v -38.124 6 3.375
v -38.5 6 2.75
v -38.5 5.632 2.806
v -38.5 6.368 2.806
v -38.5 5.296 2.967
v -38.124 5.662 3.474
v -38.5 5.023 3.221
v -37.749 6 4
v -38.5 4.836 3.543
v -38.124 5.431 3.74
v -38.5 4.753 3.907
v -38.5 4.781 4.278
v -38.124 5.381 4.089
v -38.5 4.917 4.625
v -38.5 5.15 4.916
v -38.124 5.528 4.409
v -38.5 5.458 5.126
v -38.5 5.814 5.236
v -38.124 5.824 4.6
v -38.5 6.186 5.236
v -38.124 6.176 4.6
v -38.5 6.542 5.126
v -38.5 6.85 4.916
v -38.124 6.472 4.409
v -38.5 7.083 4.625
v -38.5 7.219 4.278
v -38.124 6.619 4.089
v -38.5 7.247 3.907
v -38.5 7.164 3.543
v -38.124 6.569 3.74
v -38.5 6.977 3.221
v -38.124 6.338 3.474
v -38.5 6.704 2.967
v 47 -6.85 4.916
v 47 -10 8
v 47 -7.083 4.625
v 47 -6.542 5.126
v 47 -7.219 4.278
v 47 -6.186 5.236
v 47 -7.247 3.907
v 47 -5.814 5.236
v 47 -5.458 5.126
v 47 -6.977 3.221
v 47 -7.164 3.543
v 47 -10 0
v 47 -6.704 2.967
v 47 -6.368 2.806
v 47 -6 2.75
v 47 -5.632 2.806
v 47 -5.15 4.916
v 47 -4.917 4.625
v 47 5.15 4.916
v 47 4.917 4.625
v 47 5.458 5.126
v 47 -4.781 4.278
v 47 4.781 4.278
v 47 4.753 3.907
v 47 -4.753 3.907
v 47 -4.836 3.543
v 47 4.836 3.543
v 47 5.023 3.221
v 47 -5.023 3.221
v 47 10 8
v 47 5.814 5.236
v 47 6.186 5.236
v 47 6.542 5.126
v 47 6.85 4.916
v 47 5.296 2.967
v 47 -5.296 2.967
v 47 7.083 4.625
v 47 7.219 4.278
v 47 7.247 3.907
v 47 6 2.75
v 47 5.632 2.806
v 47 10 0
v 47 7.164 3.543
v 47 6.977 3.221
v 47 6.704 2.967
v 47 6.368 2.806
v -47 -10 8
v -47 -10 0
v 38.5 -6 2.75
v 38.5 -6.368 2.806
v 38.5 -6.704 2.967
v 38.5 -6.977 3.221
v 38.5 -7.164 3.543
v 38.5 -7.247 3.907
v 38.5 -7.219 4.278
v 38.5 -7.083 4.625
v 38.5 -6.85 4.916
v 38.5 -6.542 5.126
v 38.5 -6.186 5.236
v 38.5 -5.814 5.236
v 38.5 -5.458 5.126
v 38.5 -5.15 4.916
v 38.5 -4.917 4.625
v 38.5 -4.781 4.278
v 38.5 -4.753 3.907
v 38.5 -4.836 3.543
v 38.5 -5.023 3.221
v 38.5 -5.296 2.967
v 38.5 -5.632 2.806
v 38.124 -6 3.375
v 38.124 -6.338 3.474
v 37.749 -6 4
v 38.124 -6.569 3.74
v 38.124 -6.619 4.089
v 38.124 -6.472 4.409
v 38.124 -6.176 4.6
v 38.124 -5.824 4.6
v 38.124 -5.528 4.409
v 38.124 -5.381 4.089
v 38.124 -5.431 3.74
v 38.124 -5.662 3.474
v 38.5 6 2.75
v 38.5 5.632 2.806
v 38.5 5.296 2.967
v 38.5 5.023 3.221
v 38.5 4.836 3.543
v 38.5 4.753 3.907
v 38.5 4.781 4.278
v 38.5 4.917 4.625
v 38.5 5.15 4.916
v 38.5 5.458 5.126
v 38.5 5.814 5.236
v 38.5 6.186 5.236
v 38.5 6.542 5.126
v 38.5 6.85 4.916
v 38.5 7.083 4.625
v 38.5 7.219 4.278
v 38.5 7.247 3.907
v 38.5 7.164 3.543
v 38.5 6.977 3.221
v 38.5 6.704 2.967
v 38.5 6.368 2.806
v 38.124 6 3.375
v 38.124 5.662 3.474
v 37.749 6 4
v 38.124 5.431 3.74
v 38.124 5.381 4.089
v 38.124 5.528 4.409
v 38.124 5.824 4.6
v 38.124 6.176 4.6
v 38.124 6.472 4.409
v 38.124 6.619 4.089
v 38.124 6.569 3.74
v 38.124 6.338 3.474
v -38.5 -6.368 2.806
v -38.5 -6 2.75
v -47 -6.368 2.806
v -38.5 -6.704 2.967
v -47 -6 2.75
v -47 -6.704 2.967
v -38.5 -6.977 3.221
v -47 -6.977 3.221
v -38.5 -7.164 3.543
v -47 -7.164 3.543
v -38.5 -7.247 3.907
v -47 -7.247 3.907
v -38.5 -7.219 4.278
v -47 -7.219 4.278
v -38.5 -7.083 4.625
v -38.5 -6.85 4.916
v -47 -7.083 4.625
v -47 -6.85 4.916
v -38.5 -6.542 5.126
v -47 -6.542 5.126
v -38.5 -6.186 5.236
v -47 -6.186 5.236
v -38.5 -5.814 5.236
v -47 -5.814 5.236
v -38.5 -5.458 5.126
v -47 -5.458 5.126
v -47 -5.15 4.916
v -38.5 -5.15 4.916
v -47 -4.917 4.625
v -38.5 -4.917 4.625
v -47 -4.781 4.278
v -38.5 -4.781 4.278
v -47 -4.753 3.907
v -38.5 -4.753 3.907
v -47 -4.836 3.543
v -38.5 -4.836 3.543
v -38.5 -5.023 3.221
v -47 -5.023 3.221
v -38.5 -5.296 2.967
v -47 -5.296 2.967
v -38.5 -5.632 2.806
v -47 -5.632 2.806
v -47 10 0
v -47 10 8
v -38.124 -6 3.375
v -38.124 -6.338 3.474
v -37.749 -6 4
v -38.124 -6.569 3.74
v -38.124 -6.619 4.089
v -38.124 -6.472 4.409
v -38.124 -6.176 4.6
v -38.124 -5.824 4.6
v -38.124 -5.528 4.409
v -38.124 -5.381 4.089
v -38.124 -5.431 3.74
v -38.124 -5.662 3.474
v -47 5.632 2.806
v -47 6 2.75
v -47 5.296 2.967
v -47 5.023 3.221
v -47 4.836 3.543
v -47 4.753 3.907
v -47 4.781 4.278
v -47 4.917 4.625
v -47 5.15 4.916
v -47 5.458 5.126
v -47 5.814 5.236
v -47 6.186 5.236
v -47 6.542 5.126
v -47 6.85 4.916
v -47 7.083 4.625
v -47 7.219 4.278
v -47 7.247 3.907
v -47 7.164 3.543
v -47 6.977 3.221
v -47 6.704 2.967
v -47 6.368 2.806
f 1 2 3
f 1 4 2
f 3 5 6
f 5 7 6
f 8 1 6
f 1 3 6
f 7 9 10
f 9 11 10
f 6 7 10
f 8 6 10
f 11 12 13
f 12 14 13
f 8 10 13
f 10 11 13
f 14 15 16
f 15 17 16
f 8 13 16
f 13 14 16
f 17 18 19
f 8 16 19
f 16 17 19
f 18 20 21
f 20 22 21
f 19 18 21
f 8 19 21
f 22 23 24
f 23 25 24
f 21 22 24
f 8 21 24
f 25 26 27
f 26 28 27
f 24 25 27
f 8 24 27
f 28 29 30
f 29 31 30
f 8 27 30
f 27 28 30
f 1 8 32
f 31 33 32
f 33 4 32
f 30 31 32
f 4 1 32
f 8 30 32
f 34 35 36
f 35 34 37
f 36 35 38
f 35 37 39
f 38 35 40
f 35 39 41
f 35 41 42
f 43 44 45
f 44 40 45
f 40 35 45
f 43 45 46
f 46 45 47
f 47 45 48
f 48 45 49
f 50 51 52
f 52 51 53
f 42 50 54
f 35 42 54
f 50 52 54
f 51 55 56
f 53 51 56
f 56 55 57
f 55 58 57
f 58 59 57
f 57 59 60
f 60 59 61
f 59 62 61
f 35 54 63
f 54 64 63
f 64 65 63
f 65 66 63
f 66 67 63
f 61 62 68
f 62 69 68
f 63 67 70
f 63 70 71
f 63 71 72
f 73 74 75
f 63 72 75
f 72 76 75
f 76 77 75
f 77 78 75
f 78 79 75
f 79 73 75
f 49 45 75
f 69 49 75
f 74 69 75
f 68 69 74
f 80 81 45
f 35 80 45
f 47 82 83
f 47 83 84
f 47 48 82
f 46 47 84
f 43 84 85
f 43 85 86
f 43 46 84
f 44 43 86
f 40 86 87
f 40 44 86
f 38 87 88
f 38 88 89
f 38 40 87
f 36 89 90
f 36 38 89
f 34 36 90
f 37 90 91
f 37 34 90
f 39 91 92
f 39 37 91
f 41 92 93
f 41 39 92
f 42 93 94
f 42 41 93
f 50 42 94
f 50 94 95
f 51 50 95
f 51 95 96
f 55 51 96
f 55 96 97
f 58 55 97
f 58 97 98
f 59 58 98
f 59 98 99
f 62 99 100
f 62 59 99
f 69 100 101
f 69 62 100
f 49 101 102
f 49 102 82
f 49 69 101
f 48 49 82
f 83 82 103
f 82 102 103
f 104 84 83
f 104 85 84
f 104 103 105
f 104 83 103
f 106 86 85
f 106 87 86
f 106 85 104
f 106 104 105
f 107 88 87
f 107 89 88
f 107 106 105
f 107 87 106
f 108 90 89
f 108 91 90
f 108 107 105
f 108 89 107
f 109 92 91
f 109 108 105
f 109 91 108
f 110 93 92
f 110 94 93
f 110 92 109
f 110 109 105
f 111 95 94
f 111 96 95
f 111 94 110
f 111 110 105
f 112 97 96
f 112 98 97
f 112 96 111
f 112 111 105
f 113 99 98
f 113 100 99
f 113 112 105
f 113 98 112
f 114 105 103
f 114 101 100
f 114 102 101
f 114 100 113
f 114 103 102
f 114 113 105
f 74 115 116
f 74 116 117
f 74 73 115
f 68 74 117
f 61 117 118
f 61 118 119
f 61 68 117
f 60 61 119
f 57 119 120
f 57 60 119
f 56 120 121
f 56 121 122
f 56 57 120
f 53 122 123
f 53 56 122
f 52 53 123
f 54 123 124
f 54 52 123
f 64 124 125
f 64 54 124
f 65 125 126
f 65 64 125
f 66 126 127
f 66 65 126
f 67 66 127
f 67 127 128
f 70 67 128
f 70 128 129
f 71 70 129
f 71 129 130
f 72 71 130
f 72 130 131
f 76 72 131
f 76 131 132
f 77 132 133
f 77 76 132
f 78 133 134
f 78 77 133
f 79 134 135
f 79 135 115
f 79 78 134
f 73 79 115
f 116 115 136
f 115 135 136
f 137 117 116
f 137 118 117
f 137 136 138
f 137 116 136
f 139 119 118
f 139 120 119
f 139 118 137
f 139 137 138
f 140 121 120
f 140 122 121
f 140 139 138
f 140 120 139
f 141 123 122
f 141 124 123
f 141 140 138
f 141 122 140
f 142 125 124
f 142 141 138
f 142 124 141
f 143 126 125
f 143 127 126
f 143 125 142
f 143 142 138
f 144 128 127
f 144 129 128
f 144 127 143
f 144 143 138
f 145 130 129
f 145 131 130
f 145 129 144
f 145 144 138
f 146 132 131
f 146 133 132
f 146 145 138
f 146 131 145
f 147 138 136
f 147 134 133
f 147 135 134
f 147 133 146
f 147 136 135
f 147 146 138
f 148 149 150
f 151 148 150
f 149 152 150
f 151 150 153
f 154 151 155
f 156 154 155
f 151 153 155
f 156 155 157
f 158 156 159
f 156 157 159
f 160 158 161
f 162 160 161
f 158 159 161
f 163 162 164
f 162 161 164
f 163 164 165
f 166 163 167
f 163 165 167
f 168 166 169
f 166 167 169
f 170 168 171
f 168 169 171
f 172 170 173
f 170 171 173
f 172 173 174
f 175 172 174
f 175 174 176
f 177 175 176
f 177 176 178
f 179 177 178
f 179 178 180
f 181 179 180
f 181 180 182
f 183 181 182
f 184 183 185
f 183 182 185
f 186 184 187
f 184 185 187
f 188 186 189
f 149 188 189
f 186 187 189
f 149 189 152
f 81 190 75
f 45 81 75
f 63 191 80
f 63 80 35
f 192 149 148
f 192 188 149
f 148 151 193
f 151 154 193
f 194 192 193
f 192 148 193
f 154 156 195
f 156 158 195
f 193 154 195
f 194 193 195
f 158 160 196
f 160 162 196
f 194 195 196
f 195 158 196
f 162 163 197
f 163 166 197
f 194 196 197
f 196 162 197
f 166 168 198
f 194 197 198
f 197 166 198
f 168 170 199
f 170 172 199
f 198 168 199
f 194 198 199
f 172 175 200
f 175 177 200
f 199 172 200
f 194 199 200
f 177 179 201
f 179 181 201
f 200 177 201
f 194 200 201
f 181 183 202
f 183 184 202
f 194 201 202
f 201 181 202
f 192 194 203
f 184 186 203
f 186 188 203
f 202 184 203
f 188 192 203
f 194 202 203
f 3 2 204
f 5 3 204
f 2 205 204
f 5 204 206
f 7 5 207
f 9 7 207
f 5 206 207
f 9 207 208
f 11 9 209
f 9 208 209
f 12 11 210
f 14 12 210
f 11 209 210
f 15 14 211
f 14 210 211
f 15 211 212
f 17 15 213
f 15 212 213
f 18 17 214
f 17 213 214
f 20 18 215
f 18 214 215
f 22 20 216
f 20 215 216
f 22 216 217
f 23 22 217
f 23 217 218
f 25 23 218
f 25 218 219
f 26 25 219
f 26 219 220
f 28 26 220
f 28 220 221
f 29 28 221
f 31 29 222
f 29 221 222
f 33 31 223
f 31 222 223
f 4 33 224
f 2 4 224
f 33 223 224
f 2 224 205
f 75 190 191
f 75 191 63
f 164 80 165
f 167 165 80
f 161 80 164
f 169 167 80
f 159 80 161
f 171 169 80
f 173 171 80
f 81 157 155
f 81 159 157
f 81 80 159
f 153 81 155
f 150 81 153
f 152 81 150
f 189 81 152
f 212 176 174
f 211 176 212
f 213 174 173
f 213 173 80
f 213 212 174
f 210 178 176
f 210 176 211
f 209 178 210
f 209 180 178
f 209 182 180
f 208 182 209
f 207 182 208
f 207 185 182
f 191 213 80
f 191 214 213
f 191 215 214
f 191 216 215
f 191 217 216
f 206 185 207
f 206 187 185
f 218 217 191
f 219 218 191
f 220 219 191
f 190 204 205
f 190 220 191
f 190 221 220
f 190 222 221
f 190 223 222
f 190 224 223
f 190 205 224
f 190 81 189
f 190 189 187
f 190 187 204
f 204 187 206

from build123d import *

# Parameters (mm, degrees)
SKETCH_1_W                      = 94
SKETCH_1_H                      = 20
EXTRUDE_1_DEPTH                 = 8
M3_HORIZONTALBAR_FIX_AT_2_COUNT = 2
M3_HORIZONTALBAR_FIX_AT_2_PITCH = 12


with BuildPart() as part:
    # 스케치1 → 보스-돌출1 (new body)
    with BuildSketch(Plane.XY):
        Rectangle(SKETCH_1_W, SKETCH_1_H)
    extrude(amount=EXTRUDE_1_DEPTH)

    # 스케치5 → M3-HORIZONTALBAR_FIX (revolve, cut)
    with BuildSketch(Plane(origin=(47, 6, 4), x_dir=(0, 0, -1), z_dir=(0, 1, 0))):
        Polygon((0, 0), (0, 9.251075774), (1.25, 8.5), (1.25, 0), align=None)
    m3_horizontalbar_fix = revolve(axis=Axis((53.35, 6, 4), (-1, 0, 0)), mode=Mode.SUBTRACT)

    # M3-HORIZONTALBAR_FIX at 2: M3-HORIZONTALBAR_FIX ×2
    with Locations(*[(0, -i * M3_HORIZONTALBAR_FIX_AT_2_PITCH, 0) for i in range(1, M3_HORIZONTALBAR_FIX_AT_2_COUNT)]):
        add(m3_horizontalbar_fix, mode=Mode.SUBTRACT)

    # 대칭 복사1: M3-HORIZONTALBAR_FIX across plane
    add(m3_horizontalbar_fix.mirror(Plane(origin=(0, 0, 0), x_dir=(0, 0, 1), z_dir=(1, 0, 0))), mode=Mode.SUBTRACT)

    # 대칭 복사1 copy 1 sketch → 대칭 복사1 copy 1 (revolve, cut)
    with BuildSketch(Plane(origin=(-47, -6, 4), x_dir=(0, 0, -1), z_dir=(0, 1, 0))):
        Polygon((0, 0), (0, -9.251075774), (1.25, -8.5), (1.25, 0), align=None)
    revolve(axis=Axis((-53.35, -6, 4), (-1, 0, 0)), mode=Mode.SUBTRACT)


solid = part.part
